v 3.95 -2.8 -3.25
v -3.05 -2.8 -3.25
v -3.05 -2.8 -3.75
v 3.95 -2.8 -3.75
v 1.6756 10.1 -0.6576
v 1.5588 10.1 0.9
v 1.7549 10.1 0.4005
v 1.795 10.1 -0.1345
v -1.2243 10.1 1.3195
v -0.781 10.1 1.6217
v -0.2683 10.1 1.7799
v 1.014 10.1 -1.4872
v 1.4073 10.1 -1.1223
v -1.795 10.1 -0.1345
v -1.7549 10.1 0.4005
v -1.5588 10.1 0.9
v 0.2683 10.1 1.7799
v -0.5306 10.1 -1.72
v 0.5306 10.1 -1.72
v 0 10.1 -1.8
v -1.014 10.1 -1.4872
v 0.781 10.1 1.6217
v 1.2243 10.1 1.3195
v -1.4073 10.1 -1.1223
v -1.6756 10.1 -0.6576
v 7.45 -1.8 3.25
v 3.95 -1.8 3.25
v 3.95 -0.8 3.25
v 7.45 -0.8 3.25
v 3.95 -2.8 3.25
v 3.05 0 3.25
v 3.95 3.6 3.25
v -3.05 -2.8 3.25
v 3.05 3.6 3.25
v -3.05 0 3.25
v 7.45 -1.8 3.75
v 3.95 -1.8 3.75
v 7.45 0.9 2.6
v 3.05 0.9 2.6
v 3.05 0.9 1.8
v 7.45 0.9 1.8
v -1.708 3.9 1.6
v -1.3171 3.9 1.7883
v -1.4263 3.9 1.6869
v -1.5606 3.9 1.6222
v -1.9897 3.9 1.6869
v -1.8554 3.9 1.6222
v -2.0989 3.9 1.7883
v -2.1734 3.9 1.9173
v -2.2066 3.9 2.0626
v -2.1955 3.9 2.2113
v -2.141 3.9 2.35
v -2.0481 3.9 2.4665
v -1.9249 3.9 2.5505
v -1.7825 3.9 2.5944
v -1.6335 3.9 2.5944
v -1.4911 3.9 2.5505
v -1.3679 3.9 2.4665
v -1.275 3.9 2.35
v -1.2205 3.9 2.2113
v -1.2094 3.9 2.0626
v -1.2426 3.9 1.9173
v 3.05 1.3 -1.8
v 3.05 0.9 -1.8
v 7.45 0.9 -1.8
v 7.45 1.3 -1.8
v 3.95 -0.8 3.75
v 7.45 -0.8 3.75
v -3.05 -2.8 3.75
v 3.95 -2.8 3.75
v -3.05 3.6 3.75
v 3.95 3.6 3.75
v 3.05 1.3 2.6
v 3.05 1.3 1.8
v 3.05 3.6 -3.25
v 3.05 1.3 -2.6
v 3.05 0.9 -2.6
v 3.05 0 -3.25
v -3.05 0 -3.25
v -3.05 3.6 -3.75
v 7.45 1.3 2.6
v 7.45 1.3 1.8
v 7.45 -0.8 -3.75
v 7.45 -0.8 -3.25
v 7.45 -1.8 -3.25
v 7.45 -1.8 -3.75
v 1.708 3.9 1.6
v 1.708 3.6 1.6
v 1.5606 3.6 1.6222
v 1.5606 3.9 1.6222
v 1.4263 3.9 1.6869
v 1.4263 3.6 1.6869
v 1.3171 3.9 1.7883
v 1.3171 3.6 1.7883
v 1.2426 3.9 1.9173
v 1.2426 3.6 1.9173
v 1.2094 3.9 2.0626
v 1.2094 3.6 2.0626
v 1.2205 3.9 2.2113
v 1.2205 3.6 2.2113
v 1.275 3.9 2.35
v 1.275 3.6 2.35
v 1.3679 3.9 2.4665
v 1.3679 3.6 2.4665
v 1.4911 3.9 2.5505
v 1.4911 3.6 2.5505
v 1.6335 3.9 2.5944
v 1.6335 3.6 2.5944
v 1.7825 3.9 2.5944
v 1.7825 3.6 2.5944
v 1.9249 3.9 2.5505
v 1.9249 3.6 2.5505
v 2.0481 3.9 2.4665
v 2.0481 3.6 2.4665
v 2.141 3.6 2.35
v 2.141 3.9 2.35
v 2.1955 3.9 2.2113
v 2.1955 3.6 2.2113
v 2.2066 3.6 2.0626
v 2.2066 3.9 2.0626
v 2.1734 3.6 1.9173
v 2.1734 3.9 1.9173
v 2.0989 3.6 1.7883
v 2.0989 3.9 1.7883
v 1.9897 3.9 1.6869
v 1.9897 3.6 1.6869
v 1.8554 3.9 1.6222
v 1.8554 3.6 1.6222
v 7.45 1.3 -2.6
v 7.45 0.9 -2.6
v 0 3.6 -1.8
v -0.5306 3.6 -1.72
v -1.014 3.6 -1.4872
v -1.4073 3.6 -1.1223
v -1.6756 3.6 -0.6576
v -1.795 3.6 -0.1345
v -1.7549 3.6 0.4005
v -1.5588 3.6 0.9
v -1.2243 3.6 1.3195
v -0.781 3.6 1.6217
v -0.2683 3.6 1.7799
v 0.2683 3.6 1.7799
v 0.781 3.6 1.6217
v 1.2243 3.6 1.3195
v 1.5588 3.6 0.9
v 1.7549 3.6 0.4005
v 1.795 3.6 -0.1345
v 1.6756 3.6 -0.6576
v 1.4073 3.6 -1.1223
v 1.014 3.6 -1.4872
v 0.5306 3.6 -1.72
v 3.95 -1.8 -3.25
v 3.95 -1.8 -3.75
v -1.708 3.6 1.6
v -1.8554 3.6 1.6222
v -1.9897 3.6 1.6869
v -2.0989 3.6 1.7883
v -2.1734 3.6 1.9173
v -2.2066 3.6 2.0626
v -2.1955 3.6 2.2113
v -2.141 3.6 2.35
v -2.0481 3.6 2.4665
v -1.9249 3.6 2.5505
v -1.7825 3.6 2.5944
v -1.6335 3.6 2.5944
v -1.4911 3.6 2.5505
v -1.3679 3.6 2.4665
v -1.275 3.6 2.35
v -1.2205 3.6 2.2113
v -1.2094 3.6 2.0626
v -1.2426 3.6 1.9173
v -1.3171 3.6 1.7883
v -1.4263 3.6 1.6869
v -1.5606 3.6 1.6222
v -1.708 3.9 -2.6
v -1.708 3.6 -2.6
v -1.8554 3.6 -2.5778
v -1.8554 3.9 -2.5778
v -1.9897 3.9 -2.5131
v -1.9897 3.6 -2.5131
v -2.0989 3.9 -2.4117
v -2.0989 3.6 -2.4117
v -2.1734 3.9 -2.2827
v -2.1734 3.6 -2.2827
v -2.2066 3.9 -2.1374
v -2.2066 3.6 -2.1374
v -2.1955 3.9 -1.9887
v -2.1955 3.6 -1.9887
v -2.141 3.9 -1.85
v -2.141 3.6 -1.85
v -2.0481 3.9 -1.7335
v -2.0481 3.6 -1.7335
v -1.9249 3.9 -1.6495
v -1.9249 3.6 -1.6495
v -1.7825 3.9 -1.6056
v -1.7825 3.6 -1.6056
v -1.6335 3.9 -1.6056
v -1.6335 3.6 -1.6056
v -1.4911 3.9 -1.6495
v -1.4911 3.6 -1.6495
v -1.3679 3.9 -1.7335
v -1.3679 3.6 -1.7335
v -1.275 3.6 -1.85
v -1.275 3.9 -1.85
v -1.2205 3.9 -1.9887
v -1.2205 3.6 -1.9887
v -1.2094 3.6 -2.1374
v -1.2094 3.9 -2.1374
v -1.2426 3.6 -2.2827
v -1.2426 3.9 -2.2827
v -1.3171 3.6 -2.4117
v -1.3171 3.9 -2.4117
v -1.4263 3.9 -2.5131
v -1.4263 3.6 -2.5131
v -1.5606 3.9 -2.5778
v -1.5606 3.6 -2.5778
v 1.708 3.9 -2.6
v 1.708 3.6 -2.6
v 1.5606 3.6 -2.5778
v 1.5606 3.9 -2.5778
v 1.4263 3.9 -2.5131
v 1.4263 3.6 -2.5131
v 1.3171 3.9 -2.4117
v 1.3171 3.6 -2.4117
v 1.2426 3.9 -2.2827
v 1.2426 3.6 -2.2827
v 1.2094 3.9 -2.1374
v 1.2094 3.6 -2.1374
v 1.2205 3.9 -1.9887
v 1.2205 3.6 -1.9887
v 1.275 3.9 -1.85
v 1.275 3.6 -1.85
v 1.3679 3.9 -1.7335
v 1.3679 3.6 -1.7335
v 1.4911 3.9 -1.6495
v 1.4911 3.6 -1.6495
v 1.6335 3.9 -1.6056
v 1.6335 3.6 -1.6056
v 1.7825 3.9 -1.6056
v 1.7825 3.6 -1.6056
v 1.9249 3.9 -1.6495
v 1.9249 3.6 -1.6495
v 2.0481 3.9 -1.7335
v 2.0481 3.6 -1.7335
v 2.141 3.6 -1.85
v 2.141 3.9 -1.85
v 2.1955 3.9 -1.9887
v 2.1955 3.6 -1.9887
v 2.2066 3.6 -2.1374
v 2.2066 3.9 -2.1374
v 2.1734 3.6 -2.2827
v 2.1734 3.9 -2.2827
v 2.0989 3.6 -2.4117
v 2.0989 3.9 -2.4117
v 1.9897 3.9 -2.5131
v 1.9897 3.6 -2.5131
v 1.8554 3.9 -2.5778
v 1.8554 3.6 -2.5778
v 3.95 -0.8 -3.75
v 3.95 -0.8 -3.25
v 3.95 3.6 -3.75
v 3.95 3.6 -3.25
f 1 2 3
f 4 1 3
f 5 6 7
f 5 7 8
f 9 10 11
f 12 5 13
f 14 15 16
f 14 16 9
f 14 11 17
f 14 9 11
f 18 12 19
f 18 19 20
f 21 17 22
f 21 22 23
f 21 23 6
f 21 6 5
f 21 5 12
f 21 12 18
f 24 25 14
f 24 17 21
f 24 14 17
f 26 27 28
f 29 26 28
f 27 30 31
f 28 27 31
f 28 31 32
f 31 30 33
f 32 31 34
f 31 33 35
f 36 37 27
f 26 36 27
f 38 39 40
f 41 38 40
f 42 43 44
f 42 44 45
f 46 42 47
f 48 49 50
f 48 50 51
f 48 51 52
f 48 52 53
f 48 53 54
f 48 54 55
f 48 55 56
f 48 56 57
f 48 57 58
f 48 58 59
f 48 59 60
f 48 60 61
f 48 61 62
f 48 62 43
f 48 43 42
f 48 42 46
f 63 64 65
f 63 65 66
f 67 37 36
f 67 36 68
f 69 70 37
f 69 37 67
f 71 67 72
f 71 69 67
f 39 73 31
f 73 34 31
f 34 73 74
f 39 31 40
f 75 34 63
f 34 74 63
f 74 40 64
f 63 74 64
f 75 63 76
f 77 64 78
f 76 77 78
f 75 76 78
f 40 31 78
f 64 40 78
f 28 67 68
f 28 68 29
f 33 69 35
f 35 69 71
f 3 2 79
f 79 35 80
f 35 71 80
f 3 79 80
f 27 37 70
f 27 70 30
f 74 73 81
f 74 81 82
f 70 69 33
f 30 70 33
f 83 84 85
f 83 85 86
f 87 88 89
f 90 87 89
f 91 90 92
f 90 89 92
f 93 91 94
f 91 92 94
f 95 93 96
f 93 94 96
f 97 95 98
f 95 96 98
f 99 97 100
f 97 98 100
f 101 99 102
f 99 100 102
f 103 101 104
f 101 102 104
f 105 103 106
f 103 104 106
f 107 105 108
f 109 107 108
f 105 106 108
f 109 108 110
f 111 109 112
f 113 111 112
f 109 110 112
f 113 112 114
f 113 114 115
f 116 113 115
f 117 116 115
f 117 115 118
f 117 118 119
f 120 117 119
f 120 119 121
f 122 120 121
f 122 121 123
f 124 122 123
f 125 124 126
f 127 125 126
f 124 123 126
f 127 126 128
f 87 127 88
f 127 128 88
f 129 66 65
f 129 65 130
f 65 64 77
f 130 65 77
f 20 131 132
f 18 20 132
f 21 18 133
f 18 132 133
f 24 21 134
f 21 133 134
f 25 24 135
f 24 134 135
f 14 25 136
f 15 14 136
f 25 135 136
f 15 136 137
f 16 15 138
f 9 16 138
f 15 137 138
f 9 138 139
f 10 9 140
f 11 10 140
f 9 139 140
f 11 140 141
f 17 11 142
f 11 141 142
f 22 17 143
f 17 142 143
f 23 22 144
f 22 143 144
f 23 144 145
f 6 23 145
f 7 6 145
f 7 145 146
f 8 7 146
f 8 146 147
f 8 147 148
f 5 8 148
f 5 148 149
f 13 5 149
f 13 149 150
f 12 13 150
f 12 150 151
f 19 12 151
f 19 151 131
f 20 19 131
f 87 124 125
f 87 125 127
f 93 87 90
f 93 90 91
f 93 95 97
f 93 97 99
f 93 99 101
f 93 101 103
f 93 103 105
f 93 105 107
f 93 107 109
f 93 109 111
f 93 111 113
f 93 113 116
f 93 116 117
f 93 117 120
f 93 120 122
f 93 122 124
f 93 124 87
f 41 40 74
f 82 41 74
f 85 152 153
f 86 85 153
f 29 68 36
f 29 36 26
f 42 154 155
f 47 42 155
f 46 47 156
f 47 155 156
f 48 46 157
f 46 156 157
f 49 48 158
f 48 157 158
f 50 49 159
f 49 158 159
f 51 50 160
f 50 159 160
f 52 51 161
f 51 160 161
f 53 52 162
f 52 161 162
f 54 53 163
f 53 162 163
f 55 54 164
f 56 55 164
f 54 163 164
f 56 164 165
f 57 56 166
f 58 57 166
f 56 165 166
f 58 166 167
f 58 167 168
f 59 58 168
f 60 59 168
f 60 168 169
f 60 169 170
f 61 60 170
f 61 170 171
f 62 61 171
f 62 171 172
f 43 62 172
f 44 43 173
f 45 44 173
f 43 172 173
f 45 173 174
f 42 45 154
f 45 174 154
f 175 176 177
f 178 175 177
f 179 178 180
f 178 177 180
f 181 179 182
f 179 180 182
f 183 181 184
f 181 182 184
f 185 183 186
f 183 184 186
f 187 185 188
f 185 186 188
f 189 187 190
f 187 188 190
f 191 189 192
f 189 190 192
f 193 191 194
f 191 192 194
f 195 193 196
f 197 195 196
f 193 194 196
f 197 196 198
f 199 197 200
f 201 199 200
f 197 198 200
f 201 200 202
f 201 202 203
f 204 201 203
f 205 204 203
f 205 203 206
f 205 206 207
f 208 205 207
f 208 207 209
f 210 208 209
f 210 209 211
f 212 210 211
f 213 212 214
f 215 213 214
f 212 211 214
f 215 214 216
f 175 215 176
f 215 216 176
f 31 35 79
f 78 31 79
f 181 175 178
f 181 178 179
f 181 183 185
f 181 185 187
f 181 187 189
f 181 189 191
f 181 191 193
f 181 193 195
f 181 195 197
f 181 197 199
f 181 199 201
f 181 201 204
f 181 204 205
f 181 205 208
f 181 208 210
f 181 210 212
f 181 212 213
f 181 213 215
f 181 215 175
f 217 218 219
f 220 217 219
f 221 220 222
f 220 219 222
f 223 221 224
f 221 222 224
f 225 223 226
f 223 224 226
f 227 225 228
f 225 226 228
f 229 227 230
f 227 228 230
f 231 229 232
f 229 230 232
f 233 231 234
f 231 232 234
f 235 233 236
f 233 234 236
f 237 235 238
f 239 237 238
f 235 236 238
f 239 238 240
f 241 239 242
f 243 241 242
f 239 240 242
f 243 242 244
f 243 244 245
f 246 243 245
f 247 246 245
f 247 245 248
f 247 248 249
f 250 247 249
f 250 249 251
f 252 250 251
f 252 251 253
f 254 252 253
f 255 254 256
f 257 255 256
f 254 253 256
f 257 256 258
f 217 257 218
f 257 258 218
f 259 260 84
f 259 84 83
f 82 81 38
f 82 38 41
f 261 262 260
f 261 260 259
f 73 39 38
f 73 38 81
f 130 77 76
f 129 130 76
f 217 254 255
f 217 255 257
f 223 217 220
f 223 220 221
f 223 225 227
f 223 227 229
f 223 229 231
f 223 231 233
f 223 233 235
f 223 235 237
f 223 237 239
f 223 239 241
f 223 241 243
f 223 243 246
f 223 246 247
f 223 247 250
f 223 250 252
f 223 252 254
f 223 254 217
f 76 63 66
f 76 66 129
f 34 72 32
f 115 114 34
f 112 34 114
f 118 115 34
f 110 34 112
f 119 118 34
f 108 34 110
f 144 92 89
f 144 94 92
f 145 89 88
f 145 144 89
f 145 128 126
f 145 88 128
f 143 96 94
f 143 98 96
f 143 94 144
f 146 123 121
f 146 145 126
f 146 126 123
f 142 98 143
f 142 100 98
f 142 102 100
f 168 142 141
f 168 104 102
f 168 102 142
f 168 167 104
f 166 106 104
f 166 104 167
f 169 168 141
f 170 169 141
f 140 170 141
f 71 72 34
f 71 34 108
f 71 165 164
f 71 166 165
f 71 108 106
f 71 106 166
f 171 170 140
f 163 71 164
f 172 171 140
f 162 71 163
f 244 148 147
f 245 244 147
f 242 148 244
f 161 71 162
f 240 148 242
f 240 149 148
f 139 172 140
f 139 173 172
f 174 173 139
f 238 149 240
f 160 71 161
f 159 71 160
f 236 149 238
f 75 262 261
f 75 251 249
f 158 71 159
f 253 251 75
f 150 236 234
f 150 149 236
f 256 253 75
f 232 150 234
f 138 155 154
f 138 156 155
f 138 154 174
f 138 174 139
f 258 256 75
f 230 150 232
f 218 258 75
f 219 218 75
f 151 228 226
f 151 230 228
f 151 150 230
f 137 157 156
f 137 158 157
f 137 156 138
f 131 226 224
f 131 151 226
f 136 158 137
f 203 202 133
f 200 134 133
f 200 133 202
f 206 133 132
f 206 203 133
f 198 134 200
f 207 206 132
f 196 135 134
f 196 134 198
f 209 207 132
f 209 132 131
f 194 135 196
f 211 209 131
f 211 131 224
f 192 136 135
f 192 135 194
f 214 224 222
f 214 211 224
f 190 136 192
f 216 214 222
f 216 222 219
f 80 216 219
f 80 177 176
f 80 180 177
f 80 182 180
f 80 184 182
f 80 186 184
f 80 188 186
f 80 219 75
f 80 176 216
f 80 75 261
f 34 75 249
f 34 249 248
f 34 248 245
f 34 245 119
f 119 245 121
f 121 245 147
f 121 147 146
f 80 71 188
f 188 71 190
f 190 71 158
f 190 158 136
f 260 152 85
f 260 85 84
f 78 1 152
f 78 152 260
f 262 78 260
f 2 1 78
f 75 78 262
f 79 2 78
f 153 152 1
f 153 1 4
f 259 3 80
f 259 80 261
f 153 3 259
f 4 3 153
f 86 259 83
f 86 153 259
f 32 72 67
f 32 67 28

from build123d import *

# Parameters (mm, degrees)
SKETCH_1_W      = 6.1
SKETCH_1_H      = 7.5
EXTRUDE_1_DEPTH = 3.6
SKETCH_1_3_R    = 1.8
EXTRUDE_2_DEPTH = 10.1
EXTRUDE_START   = 3.6
SKETCH_1_4_R    = 0.5
EXTRUDE_3_DEPTH = 0.3
SKETCH_2_W      = 0.8
SKETCH_2_H      = 0.4
EXTRUDE_4_DEPTH = 4.4
EXTRUDE_START_2 = -6.1
SKETCH_4_W      = 0.5
SKETCH_4_H      = 6.4
EXTRUDE_5_DEPTH = 7
SKETCH_4_3_W    = 0.5
SKETCH_4_3_H    = 1
EXTRUDE_6_DEPTH = 4.4


with BuildPart() as part:
    # 草图1 → 凸台-拉伸1 (new body)
    with BuildSketch(Plane(origin=(0, 0, 0), x_dir=(1, 0, 0), z_dir=(0, 1, 0))):
        Rectangle(SKETCH_1_W, SKETCH_1_H)
    extrude(amount=EXTRUDE_1_DEPTH)

    # 草图1<3> → 凸台-拉伸2 (add)
    with BuildSketch(Plane(origin=(0, 0, 0), x_dir=(1, 0, 0), z_dir=(0, 1, 0))):
        with Locations(Location((0, 0, 0), (0, 0, 90))):
            Circle(SKETCH_1_3_R)
    extrude(amount=EXTRUDE_2_DEPTH)

    # 草图1<4> → 凸台-拉伸3 (add)
    with BuildSketch(Plane(origin=(0, 0, 0), x_dir=(1, 0, 0), z_dir=(0, 1, 0)).offset(EXTRUDE_START)):
        with Locations(Location((-1.708, 2.1, 0), (0, 0, 90))):
            Circle(SKETCH_1_4_R)
        with Locations(Location((-1.708, -2.1, 0), (0, 0, 90))):
            Circle(SKETCH_1_4_R)
        with Locations(Location((1.708, -2.1, 0), (0, 0, 90))):
            Circle(SKETCH_1_4_R)
        with Locations(Location((1.708, 2.1, 0), (0, 0, 90))):
            Circle(SKETCH_1_4_R)
    extrude(amount=EXTRUDE_3_DEPTH)

    # 草图2 → 凸台-拉伸4 (add)
    with BuildSketch(Plane(origin=(3.05, 0, 0), x_dir=(0, 0, -1), z_dir=(1, 0, 0))):
        with Locations((-2.2, 1.1)):
            Rectangle(SKETCH_2_W, SKETCH_2_H)
        with Locations((2.2, 1.1)):
            Rectangle(SKETCH_2_W, SKETCH_2_H)
    extrude(amount=EXTRUDE_4_DEPTH)

    # 草图4 → 凸台-拉伸5 (add)
    with BuildSketch(Plane(origin=(3.05, 0, 0), x_dir=(0, 0, -1), z_dir=(1, 0, 0)).offset(EXTRUDE_START_2)):
        with Locations((-3.5, 0.4)):
            Rectangle(SKETCH_4_W, SKETCH_4_H)
        with Locations((3.5, 0.4)):
            Rectangle(SKETCH_4_W, SKETCH_4_H)
    extrude(amount=EXTRUDE_5_DEPTH)

    # 草图4<3> → 凸台-拉伸6 (add)
    with BuildSketch(Plane(origin=(3.05, 0, 0), x_dir=(0, 0, -1), z_dir=(1, 0, 0))):
        with Locations((3.5, -1.3)):
            Rectangle(SKETCH_4_3_W, SKETCH_4_3_H)
        with Locations((-3.5, -1.3)):
            Rectangle(SKETCH_4_3_W, SKETCH_4_3_H)
    extrude(amount=EXTRUDE_6_DEPTH)


solid = part.part
